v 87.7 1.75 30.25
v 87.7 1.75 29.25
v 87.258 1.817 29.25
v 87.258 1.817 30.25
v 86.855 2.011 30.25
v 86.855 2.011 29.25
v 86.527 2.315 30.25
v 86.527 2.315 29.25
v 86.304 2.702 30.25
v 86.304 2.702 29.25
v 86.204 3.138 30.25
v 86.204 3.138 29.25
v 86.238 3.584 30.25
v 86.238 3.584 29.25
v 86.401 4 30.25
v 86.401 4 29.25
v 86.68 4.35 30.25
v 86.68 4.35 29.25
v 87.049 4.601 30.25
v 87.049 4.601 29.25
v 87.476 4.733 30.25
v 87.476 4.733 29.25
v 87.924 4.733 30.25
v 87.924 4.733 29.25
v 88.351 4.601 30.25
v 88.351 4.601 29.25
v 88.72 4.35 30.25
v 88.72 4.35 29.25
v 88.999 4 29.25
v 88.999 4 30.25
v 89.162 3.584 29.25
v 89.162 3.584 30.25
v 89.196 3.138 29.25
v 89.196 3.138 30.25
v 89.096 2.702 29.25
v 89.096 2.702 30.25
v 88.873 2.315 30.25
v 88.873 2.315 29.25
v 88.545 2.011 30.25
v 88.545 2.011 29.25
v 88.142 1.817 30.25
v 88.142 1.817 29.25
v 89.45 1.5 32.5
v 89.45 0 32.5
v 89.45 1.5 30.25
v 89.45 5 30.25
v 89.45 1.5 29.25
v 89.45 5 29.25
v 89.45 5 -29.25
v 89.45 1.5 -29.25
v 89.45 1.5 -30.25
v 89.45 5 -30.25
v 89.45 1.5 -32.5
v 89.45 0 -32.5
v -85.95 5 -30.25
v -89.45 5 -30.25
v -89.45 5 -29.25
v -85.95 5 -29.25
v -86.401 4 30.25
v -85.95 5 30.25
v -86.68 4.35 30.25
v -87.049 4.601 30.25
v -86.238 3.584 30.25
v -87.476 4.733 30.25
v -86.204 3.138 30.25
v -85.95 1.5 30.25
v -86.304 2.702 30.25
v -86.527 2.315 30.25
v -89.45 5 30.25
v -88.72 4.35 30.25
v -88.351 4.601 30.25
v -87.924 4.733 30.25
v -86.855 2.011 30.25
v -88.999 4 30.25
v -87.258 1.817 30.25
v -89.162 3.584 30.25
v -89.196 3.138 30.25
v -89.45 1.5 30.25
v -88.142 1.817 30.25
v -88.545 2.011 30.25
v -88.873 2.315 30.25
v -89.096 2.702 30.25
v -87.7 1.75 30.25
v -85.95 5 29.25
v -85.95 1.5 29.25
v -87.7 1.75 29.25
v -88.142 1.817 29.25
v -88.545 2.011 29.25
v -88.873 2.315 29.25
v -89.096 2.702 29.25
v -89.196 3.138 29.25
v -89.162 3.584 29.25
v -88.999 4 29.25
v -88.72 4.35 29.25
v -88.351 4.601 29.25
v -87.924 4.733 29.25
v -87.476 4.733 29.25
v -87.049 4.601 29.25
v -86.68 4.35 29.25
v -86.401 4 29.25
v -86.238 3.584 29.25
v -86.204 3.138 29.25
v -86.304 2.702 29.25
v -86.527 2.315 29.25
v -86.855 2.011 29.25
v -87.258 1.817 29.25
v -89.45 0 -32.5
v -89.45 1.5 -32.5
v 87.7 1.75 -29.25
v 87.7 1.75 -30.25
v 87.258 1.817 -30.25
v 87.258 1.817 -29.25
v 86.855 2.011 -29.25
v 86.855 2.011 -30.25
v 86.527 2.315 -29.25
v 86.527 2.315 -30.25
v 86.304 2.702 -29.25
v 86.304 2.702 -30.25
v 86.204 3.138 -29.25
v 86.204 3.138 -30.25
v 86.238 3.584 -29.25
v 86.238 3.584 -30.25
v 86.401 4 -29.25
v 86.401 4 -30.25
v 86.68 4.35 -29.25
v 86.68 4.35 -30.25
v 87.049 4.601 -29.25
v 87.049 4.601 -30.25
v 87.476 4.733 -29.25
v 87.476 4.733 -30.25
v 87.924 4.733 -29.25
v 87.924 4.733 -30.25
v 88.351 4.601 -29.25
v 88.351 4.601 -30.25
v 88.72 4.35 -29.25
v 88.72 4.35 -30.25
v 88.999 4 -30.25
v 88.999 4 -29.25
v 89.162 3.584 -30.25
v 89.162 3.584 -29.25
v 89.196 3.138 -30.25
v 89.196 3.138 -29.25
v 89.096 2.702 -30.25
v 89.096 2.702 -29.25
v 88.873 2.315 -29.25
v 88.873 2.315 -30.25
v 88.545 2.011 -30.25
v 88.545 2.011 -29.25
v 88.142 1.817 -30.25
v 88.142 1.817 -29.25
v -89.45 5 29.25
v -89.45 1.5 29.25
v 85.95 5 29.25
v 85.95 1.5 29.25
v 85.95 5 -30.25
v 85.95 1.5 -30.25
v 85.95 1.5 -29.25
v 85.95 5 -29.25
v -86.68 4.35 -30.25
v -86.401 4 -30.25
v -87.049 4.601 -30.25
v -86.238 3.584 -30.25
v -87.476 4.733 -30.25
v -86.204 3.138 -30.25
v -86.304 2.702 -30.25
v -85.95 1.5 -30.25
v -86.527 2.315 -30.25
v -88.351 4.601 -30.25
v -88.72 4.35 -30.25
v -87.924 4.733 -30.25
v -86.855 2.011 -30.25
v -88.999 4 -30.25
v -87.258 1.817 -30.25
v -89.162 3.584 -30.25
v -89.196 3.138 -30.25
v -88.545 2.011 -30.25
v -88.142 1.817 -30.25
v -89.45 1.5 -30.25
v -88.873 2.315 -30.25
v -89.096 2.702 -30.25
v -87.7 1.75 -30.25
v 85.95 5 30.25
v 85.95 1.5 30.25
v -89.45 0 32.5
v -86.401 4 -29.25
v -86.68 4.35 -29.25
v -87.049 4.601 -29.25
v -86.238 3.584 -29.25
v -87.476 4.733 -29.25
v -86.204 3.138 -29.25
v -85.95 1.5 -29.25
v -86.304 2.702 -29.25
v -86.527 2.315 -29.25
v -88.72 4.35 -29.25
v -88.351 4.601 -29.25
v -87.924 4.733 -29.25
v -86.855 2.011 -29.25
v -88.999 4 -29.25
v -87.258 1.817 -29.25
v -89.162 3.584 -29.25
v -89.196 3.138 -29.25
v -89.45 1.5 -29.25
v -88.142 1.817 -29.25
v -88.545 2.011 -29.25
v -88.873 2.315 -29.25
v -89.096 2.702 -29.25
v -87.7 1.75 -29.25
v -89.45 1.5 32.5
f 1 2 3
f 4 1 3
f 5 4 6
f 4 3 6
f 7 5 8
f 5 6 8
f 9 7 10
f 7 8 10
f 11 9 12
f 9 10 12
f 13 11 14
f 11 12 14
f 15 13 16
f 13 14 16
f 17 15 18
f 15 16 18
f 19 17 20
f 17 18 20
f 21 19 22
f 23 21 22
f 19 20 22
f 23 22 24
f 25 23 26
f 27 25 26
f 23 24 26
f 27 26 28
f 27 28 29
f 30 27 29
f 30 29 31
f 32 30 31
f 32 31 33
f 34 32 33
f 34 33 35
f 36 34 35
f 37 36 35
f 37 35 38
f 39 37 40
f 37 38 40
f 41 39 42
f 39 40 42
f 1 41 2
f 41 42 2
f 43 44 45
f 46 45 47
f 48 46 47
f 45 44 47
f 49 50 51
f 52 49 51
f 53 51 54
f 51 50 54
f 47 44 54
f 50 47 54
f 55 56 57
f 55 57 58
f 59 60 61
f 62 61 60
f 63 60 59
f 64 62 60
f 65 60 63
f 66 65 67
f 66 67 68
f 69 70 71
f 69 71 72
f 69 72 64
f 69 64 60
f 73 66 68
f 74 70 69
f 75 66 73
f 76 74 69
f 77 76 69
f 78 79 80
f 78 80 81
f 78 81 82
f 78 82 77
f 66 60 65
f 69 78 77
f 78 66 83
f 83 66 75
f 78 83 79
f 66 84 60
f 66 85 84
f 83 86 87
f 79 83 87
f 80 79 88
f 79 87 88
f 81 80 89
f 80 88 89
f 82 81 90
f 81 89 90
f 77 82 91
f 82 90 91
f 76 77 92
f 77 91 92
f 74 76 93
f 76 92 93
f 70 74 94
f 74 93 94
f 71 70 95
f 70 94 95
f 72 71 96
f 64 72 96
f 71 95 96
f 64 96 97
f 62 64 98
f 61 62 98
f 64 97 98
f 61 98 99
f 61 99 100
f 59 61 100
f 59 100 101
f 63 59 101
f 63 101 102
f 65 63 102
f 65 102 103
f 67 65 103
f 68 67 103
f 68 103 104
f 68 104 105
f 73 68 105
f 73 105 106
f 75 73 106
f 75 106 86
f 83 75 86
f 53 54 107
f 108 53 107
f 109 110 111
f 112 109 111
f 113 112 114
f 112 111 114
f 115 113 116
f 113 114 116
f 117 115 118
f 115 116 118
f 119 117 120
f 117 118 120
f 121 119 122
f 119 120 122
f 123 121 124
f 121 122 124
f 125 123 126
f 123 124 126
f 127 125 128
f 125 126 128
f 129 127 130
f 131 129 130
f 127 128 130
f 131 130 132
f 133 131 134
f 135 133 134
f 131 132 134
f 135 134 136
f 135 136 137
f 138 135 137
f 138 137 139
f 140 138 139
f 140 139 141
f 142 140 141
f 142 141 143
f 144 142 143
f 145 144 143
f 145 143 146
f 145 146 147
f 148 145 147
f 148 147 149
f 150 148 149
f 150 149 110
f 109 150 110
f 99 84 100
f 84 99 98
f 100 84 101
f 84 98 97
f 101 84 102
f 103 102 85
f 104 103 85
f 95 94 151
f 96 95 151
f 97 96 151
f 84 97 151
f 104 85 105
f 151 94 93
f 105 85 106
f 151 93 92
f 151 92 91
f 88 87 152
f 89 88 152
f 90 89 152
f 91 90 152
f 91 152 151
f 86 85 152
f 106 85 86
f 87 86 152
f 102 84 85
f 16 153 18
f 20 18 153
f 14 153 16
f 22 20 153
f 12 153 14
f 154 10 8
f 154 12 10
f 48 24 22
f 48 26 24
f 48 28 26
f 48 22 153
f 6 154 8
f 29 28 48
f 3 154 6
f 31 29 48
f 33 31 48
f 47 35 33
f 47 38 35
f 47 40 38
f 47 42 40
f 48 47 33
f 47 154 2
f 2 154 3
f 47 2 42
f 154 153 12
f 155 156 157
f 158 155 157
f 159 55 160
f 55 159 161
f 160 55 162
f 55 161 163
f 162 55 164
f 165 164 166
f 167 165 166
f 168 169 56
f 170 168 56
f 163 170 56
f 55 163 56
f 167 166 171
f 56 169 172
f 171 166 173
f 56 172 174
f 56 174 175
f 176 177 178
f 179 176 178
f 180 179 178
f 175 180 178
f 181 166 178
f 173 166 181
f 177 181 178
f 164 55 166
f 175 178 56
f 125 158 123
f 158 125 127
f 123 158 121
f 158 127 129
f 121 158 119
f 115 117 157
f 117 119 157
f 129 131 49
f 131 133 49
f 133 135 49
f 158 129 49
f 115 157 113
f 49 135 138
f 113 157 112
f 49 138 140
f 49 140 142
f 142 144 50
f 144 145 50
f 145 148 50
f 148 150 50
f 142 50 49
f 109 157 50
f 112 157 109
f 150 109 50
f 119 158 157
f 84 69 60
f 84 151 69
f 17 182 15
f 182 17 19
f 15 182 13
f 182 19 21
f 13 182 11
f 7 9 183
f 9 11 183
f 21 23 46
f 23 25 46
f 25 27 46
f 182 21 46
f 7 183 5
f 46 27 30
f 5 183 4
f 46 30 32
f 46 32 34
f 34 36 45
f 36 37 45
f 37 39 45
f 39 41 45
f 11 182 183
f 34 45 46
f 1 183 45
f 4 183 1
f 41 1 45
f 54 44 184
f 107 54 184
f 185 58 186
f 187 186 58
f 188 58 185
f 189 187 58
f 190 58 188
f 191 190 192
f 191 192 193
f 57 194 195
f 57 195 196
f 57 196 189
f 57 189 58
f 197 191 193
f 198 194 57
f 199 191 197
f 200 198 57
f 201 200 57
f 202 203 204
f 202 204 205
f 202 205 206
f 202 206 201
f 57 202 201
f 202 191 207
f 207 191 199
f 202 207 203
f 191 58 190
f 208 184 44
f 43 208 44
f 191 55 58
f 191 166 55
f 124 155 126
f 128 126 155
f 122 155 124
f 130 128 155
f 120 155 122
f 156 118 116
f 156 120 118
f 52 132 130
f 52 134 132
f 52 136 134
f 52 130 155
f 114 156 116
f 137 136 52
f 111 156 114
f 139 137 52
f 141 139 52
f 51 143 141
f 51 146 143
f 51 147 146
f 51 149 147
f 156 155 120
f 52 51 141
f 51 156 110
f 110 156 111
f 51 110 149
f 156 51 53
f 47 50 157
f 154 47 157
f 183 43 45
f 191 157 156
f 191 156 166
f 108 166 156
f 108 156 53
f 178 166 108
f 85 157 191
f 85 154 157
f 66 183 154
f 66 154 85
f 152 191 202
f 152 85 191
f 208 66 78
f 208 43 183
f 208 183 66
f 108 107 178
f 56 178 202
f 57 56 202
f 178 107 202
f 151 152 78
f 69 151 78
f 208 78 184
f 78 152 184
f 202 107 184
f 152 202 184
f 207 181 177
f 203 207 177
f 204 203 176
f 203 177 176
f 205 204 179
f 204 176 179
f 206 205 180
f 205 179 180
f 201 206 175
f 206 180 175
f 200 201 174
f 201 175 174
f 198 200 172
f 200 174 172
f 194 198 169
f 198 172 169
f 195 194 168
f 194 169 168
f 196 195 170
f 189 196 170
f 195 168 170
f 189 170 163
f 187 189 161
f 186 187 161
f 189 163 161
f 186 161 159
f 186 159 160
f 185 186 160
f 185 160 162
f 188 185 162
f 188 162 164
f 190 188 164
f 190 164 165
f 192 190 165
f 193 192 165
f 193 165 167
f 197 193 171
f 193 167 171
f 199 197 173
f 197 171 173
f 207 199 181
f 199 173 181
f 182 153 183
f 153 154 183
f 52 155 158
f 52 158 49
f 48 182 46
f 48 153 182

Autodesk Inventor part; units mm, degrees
ref_plane "YZ Plane" through (0, 0, 0) normal (1, 0, 0) x (0, 1, 0)
ref_plane "XZ Plane" through (0, 0, 0) normal (0, 1, 0) x (-1, 0, 0)
ref_plane "XY Plane" through (0, 0, 0) normal (0, 0, 1) x (1, 0, 0)
sketch "Sketch1" plane through (0, 0, 0) normal (0, 1, 0) x (-1, 0, 0)
  line L0 (89.45, 32.5) -> (-89.45, 32.5)
  line L1 (-89.45, 32.5) -> (-89.45, -32.5)
  line L2 (-89.45, -32.5) -> (89.45, -32.5)
  line L3 (89.45, -32.5) -> (89.45, 32.5)
  line L4 (89.45, 32.5) -> (-89.45, -32.5) construction
  line L5 (-89.45, 32.5) -> (89.45, -32.5) construction
  point P0 (0, 0)
  dimension "d0" = 178.9
  dimension "d1" = 65
extrude "Extrusion1" add sketch "Sketch1" along normal blind 1.5
sketch "Sketch2" plane through (0, 1.5, 0) normal (0, 1, 0) x (1, 0, 0)
  line L0 (89.45, -32.5) -> (89.45, 32.5) projected
  line L1 (-89.45, -29.75) -> (89.45, -29.75)
  line L2 (89.45, -29.75) -> (89.45, 29.75)
  line L3 (89.45, 29.75) -> (-89.45, 29.75)
  line L4 (-89.45, 29.75) -> (-89.45, -29.75)
  line L5 (-89.45, -29.75) -> (89.45, 29.75) construction
  line L6 (89.45, -29.75) -> (-89.45, 29.75) construction
  line L7 (89.45, 29.75) -> (85.95, 29.75)
  line L8 (85.95, 29.75) -> (85.95, 30.25)
  line L9 (85.95, 30.25) -> (89.45, 30.25)
  line L10 (89.45, 30.25) -> (89.45, 29.75)
  line L11 (85.95, 29.75) -> (85.95, 29.25)
  line L12 (85.95, 29.25) -> (89.45, 29.25)
  line L13 (89.45, 29.25) -> (89.45, 29.75)
  line L14 (0, 0) -> (0, 29.75)
  line L15 (0, 0) -> (37, 0)
  line L16 (-89.45, 29.75) -> (-85.95, 29.75)
  line L17 (-85.95, 29.75) -> (-85.95, 30.25)
  line L18 (-85.95, 30.25) -> (-89.45, 30.25)
  line L19 (-89.45, 30.25) -> (-89.45, 29.75)
  line L20 (-85.95, 29.75) -> (-85.95, 29.25)
  line L21 (-85.95, 29.25) -> (-89.45, 29.25)
  line L22 (-89.45, 29.25) -> (-89.45, 29.75)
  line L23 (89.45, -29.75) -> (85.95, -29.75)
  line L24 (85.95, -29.75) -> (85.95, -30.25)
  line L25 (85.95, -30.25) -> (89.45, -30.25)
  line L26 (89.45, -30.25) -> (89.45, -29.75)
  line L27 (85.95, -29.75) -> (85.95, -29.25)
  line L28 (85.95, -29.25) -> (89.45, -29.25)
  line L29 (89.45, -29.25) -> (89.45, -29.75)
  line L30 (-89.45, -29.75) -> (-85.95, -29.75)
  line L31 (-85.95, -29.75) -> (-85.95, -30.25)
  line L32 (-89.45, -30.25) -> (-89.45, -29.75)
  line L33 (-85.95, -29.75) -> (-85.95, -29.25)
  line L34 (-85.95, -29.25) -> (-89.45, -29.25)
  line L35 (-89.45, -29.25) -> (-89.45, -29.75)
  line L36 (-85.95, -30.25) -> (-89.45, -30.25)
  dimension "d4" = 59.5
  dimension "d5" = 3.5
  dimension "d6" = 0.5
extrude "Extrusion2" add sketch "Sketch2" along normal blind 3.5 contours L25 L24 L1 L0 | L1 L27 L28 L0 | L12 L11 L3 L0 | L31 L36 L32 L1 | L1 L4 L34 L33 | L3 L8 L9 L0 | L4 L3 L20 L21 | L3 L19 L18 L17
hole "Hole1" at (-87.7, 3.25, 30.25) direction (0, 0, -1) diameter 3 end through all
hole "Hole2" at (87.7, 3.25, 30.25) direction (0, 0, -1) diameter 3 end through all
properties part number "Bumper big"
